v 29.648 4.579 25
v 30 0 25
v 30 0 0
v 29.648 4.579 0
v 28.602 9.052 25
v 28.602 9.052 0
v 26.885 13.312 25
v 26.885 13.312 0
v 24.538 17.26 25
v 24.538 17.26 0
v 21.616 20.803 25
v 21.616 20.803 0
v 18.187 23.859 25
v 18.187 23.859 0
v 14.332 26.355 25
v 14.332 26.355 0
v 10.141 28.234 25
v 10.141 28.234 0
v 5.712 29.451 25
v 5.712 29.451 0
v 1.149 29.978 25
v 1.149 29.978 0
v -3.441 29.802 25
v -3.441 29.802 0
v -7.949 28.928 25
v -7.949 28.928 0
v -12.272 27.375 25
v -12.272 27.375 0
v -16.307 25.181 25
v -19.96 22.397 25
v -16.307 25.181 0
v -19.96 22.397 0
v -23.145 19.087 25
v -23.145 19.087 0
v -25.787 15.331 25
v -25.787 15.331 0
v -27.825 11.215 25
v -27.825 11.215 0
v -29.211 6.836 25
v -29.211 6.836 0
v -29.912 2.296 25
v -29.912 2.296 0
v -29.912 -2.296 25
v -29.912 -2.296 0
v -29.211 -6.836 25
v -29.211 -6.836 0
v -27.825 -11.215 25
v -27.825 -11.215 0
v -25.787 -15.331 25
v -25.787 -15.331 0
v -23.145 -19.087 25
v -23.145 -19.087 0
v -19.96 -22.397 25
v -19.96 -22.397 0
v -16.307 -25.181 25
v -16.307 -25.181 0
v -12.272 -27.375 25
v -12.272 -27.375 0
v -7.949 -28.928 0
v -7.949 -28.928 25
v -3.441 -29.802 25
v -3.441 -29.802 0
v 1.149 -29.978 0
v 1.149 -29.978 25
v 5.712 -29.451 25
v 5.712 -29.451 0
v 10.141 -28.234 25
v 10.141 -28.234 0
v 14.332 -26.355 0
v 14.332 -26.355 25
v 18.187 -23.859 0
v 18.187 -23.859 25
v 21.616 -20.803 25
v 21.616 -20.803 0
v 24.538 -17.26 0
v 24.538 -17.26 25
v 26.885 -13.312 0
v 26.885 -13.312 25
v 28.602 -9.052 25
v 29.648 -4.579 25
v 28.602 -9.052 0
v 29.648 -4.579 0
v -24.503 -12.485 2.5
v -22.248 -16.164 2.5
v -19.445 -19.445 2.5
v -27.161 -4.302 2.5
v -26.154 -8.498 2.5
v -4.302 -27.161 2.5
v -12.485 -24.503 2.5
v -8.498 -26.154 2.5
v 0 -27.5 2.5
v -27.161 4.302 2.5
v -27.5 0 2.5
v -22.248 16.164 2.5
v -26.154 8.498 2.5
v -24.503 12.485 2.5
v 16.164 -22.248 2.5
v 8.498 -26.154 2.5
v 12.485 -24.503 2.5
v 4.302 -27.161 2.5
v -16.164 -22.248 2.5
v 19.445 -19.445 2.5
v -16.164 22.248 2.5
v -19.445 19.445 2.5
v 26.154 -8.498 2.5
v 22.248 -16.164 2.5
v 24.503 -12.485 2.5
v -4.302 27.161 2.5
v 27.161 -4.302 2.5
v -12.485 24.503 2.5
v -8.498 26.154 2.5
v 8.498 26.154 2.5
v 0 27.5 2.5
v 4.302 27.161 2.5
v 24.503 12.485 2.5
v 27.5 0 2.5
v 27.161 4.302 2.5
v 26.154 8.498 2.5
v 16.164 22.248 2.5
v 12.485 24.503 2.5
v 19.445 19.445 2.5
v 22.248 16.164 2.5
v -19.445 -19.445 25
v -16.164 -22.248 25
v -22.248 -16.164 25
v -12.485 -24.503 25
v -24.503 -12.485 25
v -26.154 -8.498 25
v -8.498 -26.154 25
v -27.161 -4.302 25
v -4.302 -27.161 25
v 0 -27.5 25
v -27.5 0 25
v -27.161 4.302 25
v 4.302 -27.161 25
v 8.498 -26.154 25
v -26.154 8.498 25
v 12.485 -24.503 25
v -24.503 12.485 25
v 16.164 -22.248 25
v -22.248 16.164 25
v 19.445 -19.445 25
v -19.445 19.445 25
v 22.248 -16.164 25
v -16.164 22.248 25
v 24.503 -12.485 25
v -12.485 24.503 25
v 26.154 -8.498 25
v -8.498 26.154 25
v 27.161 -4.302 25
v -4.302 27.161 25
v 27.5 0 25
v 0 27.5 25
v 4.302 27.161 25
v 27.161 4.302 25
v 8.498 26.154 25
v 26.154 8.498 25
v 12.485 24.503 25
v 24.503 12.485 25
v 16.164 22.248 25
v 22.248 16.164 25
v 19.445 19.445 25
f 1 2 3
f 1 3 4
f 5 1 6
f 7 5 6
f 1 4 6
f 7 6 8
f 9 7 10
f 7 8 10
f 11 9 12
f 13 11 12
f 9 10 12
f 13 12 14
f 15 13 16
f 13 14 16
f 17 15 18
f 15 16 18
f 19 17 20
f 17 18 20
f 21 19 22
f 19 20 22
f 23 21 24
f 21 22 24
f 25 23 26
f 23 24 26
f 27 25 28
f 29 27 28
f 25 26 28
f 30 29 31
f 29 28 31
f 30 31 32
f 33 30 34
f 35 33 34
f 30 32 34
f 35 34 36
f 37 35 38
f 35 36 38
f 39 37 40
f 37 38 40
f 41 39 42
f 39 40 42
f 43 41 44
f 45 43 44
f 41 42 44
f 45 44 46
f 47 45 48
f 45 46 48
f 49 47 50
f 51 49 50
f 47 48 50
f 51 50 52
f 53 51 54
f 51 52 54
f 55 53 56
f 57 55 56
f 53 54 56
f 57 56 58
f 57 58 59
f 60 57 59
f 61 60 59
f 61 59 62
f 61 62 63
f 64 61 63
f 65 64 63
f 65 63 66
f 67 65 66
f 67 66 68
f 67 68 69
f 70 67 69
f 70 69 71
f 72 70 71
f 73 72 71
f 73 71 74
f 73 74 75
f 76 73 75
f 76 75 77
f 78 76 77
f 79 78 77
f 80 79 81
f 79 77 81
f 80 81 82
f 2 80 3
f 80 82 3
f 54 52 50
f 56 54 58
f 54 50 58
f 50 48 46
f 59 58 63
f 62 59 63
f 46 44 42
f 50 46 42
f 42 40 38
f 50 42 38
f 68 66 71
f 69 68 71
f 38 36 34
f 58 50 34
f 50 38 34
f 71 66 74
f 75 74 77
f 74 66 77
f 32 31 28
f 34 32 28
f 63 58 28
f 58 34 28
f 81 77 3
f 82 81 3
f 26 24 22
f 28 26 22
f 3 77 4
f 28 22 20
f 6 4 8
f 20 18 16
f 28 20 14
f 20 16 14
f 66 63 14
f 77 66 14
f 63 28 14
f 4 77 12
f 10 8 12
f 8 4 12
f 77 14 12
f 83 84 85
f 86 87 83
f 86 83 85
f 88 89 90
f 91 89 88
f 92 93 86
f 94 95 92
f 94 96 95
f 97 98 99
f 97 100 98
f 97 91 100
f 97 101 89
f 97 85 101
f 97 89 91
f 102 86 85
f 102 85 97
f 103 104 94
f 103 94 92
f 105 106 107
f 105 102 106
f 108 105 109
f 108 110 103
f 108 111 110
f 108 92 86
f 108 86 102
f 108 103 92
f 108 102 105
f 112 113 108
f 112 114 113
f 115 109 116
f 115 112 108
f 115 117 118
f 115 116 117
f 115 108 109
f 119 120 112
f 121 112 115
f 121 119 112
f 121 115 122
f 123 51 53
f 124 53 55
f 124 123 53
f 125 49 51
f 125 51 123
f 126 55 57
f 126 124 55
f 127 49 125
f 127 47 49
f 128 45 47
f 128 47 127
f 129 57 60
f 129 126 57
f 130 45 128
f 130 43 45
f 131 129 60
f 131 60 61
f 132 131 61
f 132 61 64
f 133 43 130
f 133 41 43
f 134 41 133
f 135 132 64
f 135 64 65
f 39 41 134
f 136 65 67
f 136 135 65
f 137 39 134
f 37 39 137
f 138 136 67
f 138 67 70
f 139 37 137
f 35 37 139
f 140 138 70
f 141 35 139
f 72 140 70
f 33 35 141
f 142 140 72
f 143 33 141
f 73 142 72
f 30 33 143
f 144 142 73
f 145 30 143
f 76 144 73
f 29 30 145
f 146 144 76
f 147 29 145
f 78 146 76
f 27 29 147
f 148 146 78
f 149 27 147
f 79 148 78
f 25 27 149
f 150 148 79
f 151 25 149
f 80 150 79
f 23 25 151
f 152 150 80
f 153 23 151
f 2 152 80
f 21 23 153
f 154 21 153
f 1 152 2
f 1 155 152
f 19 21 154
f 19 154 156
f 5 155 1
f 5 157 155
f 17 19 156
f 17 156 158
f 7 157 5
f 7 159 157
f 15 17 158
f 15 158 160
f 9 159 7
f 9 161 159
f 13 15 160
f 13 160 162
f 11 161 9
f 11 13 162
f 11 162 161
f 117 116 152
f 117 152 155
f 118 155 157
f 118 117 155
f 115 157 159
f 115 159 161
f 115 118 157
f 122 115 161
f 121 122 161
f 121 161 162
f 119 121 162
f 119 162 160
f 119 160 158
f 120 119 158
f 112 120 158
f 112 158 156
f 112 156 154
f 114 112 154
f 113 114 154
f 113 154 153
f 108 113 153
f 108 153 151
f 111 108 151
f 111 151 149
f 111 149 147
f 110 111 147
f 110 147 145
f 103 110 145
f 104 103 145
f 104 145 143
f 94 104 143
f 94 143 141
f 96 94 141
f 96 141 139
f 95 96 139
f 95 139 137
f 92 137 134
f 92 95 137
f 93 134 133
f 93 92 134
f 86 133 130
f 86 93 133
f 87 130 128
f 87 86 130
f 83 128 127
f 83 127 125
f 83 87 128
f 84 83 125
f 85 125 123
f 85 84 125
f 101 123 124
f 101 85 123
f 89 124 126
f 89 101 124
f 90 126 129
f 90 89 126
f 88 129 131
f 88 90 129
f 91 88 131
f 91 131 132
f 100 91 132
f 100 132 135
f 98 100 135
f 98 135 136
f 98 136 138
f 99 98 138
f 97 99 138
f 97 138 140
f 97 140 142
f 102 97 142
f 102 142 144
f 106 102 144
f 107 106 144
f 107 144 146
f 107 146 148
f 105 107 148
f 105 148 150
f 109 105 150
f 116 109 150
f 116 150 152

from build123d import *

# Parameters (mm, degrees)
F0_W     = 200
F0_H     = 150
F1_DEPTH = 100
F2_T     = -2.5
F3_R     = 5
F5_R     = 30
F6_DEPTH = 25
F7_T     = -2.5


with BuildPart() as f1:
    # F0 (on Top) → F1 (new body)
    with BuildSketch(Plane.XY):
        Rectangle(F0_W, F0_H)
    extrude(amount=F1_DEPTH)

    # F2
    f2_openings = [f1.faces().sort_by_distance(p)[0] for p in [
        (0, 0, 100),
    ]]
    offset(amount=F2_T, openings=f2_openings)

    # F3
    f3_edges = [f1.edges().sort_by_distance(p)[0] for p in [
        (-100, -75, 50),
        (-100, 75, 50),
        (100, 75, 50),
        (100, -75, 50),
    ]]
    fillet(f3_edges, radius=F3_R)


with BuildPart() as f6:
    # F5 (on Top) → F6 (new body)
    with BuildSketch(Plane.XY):
        Circle(F5_R)
    extrude(amount=F6_DEPTH)

    # F7
    f7_openings = [f6.faces().sort_by_distance(p)[0] for p in [
        (0, 0, 25),
    ]]
    offset(amount=F7_T, openings=f7_openings)


solid = f6.part
